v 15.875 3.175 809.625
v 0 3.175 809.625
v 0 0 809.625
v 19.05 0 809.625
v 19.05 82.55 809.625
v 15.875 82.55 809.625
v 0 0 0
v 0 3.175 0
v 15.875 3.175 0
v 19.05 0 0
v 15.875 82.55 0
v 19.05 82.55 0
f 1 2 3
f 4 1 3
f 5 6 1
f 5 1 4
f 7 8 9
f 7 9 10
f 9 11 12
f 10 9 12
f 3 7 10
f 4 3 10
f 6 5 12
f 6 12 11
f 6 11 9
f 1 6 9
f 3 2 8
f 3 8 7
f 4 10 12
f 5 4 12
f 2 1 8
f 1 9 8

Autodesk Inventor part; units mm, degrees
ref_plane "YZ Plane" through (0, 0, 0) normal (1, 0, 0) x (0, 1, 0)
ref_plane "XZ Plane" through (0, 0, 0) normal (0, 1, 0) x (-1, 0, 0)
ref_plane "XY Plane" through (0, 0, 0) normal (0, 0, 1) x (1, 0, 0)
sketch "Sketch1" plane through (0, 0, 0) normal (0, 0, 1) x (1, 0, 0)
  line L0 (0, 0) -> (19.05, 0)
  line L1 (0, 0) -> (19.05, 0) construction
  line L2 (19.05, 0) -> (19.05, 82.55)
  line L3 (19.05, 82.55) -> (15.875, 82.55)
  line L4 (15.875, 82.55) -> (15.875, 3.175)
  line L5 (15.875, 3.175) -> (0, 3.175)
  line L6 (0, 3.175) -> (0, 0)
  dimension "d0" = 19.05
  dimension "d1" = 0
  dimension "d2" = 82.55
  dimension "d3" = 90
  dimension "d4" = 3.175
  dimension "d5" = 79.375
sketch "Sketch2" plane through (0, 0, 0) normal (0, 0, 1) x (1, 0, 0)
  point P0 (0, 0)
extrude "Extrusion3" add sketch "Sketch1" along normal blind 809.625
properties part number "ISPFrame"
